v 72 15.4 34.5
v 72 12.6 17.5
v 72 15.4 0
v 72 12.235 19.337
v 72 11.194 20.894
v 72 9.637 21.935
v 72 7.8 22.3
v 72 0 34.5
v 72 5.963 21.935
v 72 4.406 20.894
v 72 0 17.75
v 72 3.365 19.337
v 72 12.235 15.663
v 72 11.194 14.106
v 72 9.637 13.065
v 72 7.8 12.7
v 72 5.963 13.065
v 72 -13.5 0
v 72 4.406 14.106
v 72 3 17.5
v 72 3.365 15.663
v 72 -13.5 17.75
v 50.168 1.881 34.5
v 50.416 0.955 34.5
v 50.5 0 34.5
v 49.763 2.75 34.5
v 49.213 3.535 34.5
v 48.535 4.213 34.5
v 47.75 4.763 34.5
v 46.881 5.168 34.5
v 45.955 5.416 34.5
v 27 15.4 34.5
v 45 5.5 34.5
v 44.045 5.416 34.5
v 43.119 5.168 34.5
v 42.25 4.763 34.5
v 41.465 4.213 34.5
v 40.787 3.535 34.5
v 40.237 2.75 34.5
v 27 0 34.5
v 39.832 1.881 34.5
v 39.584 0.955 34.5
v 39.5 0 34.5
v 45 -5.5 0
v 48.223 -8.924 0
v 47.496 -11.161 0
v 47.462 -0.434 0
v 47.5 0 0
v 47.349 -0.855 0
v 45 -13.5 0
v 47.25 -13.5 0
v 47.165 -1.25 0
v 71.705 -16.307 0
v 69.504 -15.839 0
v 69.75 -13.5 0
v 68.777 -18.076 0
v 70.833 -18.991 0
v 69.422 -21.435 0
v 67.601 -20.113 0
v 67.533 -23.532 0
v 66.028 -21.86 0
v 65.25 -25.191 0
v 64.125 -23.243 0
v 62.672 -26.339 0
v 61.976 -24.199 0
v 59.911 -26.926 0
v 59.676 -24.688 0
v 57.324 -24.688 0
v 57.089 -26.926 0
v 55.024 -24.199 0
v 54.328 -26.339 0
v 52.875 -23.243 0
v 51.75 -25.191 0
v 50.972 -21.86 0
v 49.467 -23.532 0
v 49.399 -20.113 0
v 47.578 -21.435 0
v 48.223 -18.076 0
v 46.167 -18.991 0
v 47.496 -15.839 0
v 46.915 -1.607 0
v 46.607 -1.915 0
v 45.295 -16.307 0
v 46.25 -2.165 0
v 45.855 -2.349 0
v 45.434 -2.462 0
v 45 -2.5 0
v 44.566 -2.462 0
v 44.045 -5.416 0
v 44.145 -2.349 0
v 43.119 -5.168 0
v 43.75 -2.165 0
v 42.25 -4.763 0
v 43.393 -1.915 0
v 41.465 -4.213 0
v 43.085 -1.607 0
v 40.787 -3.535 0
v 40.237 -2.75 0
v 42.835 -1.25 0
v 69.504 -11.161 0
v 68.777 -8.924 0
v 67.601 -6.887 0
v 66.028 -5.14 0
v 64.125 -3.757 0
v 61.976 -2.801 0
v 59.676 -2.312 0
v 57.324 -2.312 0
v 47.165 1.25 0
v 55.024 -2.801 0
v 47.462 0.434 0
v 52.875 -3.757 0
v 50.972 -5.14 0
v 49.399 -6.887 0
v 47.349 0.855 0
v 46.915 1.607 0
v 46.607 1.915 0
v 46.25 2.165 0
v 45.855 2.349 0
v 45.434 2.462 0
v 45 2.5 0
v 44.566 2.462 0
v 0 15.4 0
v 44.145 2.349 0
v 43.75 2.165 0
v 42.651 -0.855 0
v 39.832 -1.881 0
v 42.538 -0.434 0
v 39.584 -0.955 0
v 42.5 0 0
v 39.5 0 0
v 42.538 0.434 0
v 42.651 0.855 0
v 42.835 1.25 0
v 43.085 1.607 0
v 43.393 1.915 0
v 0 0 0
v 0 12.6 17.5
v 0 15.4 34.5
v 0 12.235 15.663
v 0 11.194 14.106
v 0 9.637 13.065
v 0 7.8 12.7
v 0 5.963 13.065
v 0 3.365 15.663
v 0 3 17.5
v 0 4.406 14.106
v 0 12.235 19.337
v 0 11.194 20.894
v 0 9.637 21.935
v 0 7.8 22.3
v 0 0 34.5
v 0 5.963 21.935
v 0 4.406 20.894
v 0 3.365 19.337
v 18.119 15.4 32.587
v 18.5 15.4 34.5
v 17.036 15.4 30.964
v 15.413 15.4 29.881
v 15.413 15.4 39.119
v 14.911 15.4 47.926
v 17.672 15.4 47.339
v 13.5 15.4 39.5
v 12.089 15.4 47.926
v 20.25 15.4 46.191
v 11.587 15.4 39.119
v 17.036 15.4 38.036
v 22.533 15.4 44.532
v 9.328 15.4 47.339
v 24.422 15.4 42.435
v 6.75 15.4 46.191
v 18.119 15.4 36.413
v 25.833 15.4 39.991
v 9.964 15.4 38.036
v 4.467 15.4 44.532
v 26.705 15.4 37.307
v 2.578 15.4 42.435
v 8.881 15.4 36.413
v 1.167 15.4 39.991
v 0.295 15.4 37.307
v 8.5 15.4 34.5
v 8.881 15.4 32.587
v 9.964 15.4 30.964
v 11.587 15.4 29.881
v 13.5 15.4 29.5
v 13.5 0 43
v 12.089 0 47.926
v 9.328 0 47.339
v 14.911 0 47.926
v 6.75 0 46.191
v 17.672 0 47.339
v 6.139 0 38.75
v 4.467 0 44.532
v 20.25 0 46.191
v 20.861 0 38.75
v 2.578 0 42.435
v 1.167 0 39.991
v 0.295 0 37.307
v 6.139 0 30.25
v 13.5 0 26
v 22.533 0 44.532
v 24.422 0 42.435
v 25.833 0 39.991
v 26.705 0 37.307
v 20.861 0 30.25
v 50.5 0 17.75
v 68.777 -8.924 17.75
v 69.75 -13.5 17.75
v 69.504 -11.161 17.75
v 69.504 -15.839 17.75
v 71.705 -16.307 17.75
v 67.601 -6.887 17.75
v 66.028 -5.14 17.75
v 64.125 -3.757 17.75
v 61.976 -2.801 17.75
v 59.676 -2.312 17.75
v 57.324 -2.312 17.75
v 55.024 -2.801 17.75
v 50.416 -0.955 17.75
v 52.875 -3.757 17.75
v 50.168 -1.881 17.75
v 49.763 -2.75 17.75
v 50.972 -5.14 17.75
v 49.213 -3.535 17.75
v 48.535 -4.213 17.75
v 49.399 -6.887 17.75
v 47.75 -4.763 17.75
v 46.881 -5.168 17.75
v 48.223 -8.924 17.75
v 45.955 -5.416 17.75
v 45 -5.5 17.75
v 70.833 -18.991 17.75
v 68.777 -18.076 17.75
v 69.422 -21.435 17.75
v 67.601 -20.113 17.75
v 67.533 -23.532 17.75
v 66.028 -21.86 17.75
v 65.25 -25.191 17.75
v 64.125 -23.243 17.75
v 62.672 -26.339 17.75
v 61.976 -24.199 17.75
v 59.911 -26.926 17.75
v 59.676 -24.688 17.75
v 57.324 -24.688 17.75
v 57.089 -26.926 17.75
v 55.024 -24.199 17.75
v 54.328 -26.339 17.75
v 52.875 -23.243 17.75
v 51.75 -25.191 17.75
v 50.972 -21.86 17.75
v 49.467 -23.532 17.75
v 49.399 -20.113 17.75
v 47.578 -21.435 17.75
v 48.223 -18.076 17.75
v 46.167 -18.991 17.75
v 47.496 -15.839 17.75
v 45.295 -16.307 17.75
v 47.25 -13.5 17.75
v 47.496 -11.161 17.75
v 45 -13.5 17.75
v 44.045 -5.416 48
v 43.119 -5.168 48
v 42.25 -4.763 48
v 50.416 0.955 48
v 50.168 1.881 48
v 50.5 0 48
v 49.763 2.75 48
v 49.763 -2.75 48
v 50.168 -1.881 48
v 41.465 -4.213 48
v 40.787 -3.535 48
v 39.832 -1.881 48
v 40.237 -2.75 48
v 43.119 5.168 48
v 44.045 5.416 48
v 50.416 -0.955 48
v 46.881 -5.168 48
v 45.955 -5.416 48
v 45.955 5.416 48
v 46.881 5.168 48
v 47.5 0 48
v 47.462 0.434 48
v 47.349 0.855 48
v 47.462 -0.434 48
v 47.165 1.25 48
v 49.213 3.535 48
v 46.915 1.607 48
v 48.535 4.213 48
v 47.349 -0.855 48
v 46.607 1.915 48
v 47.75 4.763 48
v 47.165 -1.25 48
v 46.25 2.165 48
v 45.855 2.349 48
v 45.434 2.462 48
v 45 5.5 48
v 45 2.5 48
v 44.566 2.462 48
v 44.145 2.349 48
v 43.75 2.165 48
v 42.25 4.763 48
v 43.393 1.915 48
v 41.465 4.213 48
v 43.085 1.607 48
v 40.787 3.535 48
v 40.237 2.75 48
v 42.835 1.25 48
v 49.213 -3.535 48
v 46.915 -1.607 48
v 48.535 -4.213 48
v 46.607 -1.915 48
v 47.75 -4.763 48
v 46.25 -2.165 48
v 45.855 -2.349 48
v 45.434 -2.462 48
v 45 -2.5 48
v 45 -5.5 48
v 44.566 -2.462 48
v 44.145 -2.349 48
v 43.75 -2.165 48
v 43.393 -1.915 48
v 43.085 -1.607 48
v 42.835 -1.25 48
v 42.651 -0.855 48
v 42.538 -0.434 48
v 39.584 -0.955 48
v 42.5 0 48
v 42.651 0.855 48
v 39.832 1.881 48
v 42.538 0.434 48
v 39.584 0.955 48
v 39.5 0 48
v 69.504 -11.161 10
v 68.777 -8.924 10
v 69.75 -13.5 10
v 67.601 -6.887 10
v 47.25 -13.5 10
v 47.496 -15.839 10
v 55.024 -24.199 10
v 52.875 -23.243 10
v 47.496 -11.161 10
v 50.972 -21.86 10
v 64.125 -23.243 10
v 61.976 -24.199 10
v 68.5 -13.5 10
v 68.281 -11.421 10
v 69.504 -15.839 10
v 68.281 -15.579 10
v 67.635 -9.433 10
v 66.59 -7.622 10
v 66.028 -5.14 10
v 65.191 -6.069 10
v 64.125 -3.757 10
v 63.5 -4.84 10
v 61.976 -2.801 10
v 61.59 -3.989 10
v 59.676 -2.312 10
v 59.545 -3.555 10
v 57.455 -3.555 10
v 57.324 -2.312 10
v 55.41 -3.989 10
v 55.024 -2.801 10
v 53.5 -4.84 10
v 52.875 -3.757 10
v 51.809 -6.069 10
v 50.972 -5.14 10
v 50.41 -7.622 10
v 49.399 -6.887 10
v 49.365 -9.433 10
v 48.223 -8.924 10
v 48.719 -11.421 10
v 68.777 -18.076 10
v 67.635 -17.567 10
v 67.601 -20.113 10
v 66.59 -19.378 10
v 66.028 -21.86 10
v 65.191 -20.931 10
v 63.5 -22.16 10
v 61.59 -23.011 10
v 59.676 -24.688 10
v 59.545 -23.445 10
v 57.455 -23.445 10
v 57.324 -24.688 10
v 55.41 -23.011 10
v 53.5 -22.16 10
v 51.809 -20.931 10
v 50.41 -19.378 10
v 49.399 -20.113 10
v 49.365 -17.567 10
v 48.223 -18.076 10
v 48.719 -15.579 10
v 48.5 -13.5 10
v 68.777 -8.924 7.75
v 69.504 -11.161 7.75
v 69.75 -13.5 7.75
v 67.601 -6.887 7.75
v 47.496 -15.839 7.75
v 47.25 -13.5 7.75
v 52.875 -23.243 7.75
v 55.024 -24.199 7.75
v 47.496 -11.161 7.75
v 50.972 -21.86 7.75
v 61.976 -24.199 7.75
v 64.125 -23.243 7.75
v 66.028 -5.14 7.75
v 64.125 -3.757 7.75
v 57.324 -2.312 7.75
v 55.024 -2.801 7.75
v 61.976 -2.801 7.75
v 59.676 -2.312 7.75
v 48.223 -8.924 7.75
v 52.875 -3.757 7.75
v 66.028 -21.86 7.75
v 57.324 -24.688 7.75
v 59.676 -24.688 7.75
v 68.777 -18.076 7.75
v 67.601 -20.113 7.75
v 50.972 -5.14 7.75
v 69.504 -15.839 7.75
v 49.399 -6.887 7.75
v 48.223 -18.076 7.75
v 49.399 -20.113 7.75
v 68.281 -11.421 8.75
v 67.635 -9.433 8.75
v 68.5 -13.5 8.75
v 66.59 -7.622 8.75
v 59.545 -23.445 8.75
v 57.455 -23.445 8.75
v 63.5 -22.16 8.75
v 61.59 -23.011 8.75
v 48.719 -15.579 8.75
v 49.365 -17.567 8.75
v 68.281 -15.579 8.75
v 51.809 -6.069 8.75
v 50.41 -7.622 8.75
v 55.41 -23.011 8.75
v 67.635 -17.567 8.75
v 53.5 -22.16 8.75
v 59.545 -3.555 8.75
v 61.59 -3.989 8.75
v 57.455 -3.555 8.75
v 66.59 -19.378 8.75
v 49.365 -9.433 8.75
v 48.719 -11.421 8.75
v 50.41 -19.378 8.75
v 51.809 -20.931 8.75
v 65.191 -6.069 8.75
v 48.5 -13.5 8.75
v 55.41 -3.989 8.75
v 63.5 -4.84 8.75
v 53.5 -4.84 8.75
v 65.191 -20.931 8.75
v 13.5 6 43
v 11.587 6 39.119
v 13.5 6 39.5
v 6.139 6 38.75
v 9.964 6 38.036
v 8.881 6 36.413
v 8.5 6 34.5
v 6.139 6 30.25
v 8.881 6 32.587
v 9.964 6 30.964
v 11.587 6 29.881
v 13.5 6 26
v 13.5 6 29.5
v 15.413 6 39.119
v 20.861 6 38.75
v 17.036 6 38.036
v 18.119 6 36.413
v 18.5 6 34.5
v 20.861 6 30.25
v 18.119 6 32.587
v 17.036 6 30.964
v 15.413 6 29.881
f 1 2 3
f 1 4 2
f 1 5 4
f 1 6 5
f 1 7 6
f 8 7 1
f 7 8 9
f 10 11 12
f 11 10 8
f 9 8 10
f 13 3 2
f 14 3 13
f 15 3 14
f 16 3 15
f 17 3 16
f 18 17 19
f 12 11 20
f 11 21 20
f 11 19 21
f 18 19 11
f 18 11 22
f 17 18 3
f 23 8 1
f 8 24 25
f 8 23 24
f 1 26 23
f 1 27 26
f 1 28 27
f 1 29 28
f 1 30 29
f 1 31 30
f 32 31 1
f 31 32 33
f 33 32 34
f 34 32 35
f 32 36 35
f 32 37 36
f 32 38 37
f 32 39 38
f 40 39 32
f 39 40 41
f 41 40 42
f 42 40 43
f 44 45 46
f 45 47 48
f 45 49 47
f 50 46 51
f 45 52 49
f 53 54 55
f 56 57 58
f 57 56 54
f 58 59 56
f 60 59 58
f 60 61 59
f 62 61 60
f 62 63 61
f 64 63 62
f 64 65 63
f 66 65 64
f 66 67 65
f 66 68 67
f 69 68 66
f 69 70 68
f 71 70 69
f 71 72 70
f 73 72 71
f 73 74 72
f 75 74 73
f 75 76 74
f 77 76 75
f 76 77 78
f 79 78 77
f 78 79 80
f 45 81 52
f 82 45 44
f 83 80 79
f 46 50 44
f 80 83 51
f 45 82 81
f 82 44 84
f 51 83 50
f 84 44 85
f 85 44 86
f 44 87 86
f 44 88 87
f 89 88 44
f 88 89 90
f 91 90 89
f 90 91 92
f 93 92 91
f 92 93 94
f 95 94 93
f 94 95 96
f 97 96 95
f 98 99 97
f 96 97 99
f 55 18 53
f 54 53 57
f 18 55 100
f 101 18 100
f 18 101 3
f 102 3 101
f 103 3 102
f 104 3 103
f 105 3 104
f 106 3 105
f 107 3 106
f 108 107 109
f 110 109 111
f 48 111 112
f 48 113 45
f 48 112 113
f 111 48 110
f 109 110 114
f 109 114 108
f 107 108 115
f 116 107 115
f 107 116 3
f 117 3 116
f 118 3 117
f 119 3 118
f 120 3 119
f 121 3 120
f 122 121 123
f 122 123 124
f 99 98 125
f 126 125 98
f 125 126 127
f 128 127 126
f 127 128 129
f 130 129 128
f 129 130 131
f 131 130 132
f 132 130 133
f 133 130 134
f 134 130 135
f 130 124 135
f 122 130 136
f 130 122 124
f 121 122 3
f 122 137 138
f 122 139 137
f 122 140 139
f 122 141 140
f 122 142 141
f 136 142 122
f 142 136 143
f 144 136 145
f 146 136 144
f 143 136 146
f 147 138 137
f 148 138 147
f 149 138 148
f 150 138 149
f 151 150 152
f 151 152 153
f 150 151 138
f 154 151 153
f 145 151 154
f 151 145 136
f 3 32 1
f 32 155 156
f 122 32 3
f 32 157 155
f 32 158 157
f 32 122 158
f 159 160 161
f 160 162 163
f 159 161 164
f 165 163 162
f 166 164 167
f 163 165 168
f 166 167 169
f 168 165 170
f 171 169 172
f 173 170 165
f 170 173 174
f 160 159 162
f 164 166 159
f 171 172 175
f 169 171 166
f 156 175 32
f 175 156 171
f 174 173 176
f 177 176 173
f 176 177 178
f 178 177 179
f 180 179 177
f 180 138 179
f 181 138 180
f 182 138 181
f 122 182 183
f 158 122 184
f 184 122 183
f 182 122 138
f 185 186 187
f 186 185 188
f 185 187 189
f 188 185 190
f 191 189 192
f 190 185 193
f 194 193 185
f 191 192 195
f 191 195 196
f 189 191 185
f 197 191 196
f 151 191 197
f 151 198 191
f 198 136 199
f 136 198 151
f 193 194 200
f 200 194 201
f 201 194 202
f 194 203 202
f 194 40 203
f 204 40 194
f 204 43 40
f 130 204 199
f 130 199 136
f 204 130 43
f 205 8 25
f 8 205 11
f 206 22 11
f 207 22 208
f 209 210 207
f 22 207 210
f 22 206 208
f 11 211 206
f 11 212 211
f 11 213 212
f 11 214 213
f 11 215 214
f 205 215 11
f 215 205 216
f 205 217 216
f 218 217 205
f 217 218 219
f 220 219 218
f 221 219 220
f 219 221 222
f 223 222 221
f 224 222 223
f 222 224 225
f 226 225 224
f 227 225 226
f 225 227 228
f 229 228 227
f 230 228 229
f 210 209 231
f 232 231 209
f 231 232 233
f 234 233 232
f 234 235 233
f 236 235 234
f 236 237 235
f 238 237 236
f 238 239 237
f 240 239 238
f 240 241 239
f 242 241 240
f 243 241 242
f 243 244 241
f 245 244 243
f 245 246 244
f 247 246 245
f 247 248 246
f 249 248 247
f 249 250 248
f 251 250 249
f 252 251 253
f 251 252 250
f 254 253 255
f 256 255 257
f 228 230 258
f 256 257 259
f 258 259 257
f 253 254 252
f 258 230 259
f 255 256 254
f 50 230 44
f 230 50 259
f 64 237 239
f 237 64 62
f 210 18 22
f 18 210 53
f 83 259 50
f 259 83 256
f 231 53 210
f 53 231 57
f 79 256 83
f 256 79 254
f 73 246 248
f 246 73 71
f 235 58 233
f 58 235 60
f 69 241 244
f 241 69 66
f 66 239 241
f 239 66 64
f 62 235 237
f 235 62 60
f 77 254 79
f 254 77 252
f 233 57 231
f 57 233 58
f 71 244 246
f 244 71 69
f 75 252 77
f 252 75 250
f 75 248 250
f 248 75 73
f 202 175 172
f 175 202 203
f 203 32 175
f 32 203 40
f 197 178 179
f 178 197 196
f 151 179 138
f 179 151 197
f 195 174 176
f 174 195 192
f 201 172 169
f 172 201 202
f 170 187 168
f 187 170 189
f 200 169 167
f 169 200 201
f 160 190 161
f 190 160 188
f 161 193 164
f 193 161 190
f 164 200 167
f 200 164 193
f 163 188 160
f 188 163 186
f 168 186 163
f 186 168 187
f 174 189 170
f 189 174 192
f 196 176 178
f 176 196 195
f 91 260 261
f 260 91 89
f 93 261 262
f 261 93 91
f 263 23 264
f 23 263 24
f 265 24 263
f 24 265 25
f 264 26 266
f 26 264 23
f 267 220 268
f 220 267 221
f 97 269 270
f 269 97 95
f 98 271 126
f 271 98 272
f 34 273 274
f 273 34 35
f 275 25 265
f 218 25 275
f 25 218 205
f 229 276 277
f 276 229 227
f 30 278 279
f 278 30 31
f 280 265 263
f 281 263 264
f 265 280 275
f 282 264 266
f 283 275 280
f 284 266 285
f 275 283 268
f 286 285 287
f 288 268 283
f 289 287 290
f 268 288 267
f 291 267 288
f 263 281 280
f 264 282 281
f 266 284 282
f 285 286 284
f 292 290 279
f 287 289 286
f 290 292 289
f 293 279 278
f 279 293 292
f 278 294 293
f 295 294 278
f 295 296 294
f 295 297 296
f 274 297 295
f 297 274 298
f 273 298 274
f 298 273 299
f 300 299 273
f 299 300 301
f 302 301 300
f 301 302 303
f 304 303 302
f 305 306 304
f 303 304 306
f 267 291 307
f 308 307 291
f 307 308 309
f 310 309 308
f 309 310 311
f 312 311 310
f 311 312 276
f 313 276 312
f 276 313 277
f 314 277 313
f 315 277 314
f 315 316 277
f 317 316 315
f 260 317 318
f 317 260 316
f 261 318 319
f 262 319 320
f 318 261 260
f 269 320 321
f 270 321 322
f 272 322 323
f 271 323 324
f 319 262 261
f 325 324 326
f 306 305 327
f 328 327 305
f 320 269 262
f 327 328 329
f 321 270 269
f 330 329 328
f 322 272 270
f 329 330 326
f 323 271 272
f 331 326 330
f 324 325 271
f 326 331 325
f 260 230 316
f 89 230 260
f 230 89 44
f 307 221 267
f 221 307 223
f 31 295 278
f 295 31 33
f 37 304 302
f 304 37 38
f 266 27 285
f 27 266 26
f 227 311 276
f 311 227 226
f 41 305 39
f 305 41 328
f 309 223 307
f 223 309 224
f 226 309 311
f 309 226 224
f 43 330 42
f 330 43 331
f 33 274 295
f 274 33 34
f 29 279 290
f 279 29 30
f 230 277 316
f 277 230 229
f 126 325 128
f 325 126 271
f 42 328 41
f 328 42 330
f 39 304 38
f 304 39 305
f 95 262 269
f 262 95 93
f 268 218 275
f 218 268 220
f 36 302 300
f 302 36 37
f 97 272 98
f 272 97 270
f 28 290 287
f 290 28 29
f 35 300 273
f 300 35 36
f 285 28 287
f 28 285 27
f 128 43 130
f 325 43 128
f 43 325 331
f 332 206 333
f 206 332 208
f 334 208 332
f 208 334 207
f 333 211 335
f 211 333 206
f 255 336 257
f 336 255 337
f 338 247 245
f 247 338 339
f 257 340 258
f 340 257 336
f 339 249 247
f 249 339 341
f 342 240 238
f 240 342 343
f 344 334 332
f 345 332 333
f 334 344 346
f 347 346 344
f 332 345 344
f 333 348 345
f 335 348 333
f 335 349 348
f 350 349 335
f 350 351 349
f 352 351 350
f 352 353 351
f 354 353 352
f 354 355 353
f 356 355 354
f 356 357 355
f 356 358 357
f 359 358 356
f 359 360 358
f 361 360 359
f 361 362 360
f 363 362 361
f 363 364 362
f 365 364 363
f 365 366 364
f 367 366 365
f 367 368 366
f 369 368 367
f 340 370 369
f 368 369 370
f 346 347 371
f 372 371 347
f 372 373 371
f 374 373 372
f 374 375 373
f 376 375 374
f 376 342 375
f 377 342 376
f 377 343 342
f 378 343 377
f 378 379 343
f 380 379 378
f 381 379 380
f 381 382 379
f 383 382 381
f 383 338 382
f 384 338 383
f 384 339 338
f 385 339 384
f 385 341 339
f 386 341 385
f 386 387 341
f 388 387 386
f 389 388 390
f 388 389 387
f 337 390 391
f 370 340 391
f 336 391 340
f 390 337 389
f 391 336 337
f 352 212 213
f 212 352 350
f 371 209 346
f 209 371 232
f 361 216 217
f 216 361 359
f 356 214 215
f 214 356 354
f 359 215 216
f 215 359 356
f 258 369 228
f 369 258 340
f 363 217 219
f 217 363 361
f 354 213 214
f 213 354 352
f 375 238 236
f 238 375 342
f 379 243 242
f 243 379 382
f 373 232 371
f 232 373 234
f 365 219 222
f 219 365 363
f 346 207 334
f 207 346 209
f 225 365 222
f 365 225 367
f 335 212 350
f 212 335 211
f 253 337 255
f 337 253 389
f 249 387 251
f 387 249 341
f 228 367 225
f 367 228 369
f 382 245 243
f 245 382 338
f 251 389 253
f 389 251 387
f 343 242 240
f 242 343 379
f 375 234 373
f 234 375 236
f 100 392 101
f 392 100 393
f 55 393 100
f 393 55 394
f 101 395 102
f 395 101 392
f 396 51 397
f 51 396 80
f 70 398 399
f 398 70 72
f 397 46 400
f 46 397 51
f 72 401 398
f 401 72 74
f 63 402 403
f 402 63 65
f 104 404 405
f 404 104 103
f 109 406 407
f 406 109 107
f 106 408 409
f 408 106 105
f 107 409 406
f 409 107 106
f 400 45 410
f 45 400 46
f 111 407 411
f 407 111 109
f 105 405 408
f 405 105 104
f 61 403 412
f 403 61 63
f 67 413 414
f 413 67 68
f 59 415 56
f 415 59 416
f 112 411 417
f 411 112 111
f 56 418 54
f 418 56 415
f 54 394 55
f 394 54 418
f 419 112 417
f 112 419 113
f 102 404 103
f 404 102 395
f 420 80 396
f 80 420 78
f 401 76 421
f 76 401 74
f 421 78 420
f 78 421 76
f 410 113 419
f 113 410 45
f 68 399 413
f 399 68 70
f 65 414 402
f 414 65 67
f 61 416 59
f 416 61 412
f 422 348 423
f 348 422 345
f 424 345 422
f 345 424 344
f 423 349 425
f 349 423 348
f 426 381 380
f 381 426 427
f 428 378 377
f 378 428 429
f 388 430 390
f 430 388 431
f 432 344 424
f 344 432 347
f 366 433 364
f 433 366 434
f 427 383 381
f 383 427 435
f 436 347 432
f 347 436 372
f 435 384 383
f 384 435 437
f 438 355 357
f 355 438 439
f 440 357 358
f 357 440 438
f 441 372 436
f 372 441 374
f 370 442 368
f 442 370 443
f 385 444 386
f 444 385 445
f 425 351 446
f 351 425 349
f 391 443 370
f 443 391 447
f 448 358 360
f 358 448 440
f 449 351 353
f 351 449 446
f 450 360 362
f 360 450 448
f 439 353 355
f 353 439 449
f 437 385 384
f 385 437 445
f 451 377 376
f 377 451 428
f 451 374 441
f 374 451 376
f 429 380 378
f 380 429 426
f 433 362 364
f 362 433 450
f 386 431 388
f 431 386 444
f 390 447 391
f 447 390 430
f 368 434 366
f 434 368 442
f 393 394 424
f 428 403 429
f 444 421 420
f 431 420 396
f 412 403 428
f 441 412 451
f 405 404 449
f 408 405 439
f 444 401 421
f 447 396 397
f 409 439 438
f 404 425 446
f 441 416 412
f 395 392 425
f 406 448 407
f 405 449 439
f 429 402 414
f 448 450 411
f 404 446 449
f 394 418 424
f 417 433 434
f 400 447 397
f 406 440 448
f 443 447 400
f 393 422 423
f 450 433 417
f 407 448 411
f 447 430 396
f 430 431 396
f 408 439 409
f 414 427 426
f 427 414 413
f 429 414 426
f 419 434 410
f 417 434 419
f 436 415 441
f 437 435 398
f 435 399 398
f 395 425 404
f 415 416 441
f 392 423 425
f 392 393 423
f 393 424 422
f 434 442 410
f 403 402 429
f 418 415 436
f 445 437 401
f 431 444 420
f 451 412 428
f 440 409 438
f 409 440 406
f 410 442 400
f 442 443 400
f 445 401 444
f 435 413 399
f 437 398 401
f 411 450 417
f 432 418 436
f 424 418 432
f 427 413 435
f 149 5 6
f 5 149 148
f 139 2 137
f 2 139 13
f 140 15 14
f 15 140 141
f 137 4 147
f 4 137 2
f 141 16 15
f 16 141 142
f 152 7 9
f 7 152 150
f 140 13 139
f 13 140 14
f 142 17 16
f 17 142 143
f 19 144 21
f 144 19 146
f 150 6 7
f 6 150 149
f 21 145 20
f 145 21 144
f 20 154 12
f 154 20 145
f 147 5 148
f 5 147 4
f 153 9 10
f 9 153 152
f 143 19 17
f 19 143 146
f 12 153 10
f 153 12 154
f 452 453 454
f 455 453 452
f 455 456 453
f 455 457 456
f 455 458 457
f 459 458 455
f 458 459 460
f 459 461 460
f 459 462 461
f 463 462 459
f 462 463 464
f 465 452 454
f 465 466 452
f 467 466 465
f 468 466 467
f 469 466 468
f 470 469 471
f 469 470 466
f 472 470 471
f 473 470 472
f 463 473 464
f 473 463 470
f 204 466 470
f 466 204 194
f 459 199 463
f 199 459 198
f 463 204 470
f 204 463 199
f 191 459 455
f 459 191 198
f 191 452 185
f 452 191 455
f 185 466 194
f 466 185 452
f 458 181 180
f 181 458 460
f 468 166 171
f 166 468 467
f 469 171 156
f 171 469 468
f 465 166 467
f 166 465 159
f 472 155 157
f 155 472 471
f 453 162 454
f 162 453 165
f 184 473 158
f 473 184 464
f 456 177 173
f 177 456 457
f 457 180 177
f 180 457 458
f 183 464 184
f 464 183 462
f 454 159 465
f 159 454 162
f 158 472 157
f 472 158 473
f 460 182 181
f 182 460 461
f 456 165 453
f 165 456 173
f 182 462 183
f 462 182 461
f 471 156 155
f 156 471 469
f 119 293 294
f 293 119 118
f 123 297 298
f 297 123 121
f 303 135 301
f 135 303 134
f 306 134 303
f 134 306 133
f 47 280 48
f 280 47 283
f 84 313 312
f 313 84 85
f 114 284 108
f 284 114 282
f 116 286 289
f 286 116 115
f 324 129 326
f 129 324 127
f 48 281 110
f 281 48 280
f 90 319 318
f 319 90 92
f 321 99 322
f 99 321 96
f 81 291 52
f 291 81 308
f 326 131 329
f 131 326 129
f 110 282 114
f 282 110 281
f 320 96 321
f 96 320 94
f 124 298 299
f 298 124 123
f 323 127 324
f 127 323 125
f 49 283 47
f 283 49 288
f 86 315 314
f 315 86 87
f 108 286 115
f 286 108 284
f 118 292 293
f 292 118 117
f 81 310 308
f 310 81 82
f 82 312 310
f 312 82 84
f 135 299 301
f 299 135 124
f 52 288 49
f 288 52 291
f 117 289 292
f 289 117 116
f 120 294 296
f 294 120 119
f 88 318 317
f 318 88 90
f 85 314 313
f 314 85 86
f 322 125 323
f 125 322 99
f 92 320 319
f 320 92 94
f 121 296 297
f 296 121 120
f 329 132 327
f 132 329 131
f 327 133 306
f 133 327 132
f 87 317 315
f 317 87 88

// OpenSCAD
// file: parameters.scad
//
// Star tracker parameters
// Philippe Chrétien (2012)
// philippe.chretien.gmail.com
//

// Threaded rod
t_rod_out_radius = 4.8; //mm

// Skate bearing 608
bearing_out_radius = 11.25; //mm
bearing_thickness = 7.75; //mm

// M3 bolts
m3_out_radius = 1.5; //mm

// 1/4 nut
nut_1_4_radius = 6.5; //mm
nut_1_4_thickness = 5.5; //mm

// 3/8 nut
bolt_3_8_head_radius = 8.5; //mm
bolt_3_8_head_thickness = 6.0; //mm
// main file
include <parameters.scad>

base_x = 72.0;
base_y = 15.4;
base_z = 34.5;

pivot_x = 27.0;
pivot_y = pivot_x/2;
pivot_z = 17.75;

bearing_shoulder = 1.25; 
bearing_shoulder_h = 1.0; 

camera_mount_radius = 13.5;
scope_out_radius = 5.5;
scope_hole_radius = 2.5;

main_rod_heigth = 17.5;
buffer = 0.01;

module slot()
{
	union()
	{
		
		cube([slot_depth,slot_width,slot_heigth]);

		translate([0,slot_width/2,slot_heigth])
			rotate(a=90, v=[0,1,0])
				cylinder(r=slot_width/2, h=slot_depth, $fs=0.5);
	}
}

module bolt_3_8_head() 
{ 
	linear_extrude(height=bolt_3_8_head_thickness)
		circle(r=bolt_3_8_head_radius, $fn = 6);
}

difference()
{
	// Piece square stock
	union()
	{
		cube([base_x,base_y,base_z]);
	
		translate([base_x-pivot_x,-1*pivot_y,0])
			cube([pivot_x,pivot_y,pivot_z]);
	
		translate([base_x-(pivot_x/2),-1*pivot_y,0])
			cylinder(r=pivot_y, h=pivot_z);

		translate([camera_mount_radius,base_y, base_z])
			rotate(a=90, v=[1,0,0])
				cylinder(r=camera_mount_radius, h=base_y);

		translate([base_x-pivot_x,0,0])
			cylinder(r=scope_out_radius, h=base_z+camera_mount_radius, $fn=36);
	}

	// Top bearing hole
	translate([base_x-(pivot_x/2),-1*pivot_y,pivot_z-bearing_thickness])
		cylinder(r=bearing_out_radius, h=bearing_thickness);

	// Bottom bearing hole
	translate([base_x-(pivot_x/2),-1*pivot_y,0])
		cylinder(r=bearing_out_radius, h=bearing_thickness);

	// Bearing shoulder center hole
	translate([base_x-(pivot_x/2),-1*pivot_y,0])
		cylinder(r=bearing_out_radius-bearing_shoulder, h=pivot_z);

	// Bearing shoulder chamfer
	translate([base_x-(pivot_x/2),-1*pivot_y,bearing_thickness])
		cylinder(r1=bearing_out_radius, r2=bearing_out_radius-bearing_shoulder, h=bearing_shoulder_h);

	// Main rod hole
	translate([-1*buffer,t_rod_out_radius+3,main_rod_heigth])
		rotate(a=90, v=[0,1,0])
			cylinder(r=t_rod_out_radius, h=base_x+2*buffer);

	// 3/8" nut hole 
	translate([camera_mount_radius,bolt_3_8_head_thickness, base_z])
		rotate(a=90, v=[1,0,0])
			rotate(a=30, v=[0,0,1])
				bolt_3_8_head();

	// Tripod 3/8" rod hole
	translate([camera_mount_radius,base_y, base_z])
		rotate(a=90, v=[1,0,0])
			cylinder(r=t_rod_out_radius+0.2, h=base_y);	

	translate([base_x-pivot_x,0,0])
		cylinder(r=scope_hole_radius, h=base_z+camera_mount_radius, $fn=36);
}
